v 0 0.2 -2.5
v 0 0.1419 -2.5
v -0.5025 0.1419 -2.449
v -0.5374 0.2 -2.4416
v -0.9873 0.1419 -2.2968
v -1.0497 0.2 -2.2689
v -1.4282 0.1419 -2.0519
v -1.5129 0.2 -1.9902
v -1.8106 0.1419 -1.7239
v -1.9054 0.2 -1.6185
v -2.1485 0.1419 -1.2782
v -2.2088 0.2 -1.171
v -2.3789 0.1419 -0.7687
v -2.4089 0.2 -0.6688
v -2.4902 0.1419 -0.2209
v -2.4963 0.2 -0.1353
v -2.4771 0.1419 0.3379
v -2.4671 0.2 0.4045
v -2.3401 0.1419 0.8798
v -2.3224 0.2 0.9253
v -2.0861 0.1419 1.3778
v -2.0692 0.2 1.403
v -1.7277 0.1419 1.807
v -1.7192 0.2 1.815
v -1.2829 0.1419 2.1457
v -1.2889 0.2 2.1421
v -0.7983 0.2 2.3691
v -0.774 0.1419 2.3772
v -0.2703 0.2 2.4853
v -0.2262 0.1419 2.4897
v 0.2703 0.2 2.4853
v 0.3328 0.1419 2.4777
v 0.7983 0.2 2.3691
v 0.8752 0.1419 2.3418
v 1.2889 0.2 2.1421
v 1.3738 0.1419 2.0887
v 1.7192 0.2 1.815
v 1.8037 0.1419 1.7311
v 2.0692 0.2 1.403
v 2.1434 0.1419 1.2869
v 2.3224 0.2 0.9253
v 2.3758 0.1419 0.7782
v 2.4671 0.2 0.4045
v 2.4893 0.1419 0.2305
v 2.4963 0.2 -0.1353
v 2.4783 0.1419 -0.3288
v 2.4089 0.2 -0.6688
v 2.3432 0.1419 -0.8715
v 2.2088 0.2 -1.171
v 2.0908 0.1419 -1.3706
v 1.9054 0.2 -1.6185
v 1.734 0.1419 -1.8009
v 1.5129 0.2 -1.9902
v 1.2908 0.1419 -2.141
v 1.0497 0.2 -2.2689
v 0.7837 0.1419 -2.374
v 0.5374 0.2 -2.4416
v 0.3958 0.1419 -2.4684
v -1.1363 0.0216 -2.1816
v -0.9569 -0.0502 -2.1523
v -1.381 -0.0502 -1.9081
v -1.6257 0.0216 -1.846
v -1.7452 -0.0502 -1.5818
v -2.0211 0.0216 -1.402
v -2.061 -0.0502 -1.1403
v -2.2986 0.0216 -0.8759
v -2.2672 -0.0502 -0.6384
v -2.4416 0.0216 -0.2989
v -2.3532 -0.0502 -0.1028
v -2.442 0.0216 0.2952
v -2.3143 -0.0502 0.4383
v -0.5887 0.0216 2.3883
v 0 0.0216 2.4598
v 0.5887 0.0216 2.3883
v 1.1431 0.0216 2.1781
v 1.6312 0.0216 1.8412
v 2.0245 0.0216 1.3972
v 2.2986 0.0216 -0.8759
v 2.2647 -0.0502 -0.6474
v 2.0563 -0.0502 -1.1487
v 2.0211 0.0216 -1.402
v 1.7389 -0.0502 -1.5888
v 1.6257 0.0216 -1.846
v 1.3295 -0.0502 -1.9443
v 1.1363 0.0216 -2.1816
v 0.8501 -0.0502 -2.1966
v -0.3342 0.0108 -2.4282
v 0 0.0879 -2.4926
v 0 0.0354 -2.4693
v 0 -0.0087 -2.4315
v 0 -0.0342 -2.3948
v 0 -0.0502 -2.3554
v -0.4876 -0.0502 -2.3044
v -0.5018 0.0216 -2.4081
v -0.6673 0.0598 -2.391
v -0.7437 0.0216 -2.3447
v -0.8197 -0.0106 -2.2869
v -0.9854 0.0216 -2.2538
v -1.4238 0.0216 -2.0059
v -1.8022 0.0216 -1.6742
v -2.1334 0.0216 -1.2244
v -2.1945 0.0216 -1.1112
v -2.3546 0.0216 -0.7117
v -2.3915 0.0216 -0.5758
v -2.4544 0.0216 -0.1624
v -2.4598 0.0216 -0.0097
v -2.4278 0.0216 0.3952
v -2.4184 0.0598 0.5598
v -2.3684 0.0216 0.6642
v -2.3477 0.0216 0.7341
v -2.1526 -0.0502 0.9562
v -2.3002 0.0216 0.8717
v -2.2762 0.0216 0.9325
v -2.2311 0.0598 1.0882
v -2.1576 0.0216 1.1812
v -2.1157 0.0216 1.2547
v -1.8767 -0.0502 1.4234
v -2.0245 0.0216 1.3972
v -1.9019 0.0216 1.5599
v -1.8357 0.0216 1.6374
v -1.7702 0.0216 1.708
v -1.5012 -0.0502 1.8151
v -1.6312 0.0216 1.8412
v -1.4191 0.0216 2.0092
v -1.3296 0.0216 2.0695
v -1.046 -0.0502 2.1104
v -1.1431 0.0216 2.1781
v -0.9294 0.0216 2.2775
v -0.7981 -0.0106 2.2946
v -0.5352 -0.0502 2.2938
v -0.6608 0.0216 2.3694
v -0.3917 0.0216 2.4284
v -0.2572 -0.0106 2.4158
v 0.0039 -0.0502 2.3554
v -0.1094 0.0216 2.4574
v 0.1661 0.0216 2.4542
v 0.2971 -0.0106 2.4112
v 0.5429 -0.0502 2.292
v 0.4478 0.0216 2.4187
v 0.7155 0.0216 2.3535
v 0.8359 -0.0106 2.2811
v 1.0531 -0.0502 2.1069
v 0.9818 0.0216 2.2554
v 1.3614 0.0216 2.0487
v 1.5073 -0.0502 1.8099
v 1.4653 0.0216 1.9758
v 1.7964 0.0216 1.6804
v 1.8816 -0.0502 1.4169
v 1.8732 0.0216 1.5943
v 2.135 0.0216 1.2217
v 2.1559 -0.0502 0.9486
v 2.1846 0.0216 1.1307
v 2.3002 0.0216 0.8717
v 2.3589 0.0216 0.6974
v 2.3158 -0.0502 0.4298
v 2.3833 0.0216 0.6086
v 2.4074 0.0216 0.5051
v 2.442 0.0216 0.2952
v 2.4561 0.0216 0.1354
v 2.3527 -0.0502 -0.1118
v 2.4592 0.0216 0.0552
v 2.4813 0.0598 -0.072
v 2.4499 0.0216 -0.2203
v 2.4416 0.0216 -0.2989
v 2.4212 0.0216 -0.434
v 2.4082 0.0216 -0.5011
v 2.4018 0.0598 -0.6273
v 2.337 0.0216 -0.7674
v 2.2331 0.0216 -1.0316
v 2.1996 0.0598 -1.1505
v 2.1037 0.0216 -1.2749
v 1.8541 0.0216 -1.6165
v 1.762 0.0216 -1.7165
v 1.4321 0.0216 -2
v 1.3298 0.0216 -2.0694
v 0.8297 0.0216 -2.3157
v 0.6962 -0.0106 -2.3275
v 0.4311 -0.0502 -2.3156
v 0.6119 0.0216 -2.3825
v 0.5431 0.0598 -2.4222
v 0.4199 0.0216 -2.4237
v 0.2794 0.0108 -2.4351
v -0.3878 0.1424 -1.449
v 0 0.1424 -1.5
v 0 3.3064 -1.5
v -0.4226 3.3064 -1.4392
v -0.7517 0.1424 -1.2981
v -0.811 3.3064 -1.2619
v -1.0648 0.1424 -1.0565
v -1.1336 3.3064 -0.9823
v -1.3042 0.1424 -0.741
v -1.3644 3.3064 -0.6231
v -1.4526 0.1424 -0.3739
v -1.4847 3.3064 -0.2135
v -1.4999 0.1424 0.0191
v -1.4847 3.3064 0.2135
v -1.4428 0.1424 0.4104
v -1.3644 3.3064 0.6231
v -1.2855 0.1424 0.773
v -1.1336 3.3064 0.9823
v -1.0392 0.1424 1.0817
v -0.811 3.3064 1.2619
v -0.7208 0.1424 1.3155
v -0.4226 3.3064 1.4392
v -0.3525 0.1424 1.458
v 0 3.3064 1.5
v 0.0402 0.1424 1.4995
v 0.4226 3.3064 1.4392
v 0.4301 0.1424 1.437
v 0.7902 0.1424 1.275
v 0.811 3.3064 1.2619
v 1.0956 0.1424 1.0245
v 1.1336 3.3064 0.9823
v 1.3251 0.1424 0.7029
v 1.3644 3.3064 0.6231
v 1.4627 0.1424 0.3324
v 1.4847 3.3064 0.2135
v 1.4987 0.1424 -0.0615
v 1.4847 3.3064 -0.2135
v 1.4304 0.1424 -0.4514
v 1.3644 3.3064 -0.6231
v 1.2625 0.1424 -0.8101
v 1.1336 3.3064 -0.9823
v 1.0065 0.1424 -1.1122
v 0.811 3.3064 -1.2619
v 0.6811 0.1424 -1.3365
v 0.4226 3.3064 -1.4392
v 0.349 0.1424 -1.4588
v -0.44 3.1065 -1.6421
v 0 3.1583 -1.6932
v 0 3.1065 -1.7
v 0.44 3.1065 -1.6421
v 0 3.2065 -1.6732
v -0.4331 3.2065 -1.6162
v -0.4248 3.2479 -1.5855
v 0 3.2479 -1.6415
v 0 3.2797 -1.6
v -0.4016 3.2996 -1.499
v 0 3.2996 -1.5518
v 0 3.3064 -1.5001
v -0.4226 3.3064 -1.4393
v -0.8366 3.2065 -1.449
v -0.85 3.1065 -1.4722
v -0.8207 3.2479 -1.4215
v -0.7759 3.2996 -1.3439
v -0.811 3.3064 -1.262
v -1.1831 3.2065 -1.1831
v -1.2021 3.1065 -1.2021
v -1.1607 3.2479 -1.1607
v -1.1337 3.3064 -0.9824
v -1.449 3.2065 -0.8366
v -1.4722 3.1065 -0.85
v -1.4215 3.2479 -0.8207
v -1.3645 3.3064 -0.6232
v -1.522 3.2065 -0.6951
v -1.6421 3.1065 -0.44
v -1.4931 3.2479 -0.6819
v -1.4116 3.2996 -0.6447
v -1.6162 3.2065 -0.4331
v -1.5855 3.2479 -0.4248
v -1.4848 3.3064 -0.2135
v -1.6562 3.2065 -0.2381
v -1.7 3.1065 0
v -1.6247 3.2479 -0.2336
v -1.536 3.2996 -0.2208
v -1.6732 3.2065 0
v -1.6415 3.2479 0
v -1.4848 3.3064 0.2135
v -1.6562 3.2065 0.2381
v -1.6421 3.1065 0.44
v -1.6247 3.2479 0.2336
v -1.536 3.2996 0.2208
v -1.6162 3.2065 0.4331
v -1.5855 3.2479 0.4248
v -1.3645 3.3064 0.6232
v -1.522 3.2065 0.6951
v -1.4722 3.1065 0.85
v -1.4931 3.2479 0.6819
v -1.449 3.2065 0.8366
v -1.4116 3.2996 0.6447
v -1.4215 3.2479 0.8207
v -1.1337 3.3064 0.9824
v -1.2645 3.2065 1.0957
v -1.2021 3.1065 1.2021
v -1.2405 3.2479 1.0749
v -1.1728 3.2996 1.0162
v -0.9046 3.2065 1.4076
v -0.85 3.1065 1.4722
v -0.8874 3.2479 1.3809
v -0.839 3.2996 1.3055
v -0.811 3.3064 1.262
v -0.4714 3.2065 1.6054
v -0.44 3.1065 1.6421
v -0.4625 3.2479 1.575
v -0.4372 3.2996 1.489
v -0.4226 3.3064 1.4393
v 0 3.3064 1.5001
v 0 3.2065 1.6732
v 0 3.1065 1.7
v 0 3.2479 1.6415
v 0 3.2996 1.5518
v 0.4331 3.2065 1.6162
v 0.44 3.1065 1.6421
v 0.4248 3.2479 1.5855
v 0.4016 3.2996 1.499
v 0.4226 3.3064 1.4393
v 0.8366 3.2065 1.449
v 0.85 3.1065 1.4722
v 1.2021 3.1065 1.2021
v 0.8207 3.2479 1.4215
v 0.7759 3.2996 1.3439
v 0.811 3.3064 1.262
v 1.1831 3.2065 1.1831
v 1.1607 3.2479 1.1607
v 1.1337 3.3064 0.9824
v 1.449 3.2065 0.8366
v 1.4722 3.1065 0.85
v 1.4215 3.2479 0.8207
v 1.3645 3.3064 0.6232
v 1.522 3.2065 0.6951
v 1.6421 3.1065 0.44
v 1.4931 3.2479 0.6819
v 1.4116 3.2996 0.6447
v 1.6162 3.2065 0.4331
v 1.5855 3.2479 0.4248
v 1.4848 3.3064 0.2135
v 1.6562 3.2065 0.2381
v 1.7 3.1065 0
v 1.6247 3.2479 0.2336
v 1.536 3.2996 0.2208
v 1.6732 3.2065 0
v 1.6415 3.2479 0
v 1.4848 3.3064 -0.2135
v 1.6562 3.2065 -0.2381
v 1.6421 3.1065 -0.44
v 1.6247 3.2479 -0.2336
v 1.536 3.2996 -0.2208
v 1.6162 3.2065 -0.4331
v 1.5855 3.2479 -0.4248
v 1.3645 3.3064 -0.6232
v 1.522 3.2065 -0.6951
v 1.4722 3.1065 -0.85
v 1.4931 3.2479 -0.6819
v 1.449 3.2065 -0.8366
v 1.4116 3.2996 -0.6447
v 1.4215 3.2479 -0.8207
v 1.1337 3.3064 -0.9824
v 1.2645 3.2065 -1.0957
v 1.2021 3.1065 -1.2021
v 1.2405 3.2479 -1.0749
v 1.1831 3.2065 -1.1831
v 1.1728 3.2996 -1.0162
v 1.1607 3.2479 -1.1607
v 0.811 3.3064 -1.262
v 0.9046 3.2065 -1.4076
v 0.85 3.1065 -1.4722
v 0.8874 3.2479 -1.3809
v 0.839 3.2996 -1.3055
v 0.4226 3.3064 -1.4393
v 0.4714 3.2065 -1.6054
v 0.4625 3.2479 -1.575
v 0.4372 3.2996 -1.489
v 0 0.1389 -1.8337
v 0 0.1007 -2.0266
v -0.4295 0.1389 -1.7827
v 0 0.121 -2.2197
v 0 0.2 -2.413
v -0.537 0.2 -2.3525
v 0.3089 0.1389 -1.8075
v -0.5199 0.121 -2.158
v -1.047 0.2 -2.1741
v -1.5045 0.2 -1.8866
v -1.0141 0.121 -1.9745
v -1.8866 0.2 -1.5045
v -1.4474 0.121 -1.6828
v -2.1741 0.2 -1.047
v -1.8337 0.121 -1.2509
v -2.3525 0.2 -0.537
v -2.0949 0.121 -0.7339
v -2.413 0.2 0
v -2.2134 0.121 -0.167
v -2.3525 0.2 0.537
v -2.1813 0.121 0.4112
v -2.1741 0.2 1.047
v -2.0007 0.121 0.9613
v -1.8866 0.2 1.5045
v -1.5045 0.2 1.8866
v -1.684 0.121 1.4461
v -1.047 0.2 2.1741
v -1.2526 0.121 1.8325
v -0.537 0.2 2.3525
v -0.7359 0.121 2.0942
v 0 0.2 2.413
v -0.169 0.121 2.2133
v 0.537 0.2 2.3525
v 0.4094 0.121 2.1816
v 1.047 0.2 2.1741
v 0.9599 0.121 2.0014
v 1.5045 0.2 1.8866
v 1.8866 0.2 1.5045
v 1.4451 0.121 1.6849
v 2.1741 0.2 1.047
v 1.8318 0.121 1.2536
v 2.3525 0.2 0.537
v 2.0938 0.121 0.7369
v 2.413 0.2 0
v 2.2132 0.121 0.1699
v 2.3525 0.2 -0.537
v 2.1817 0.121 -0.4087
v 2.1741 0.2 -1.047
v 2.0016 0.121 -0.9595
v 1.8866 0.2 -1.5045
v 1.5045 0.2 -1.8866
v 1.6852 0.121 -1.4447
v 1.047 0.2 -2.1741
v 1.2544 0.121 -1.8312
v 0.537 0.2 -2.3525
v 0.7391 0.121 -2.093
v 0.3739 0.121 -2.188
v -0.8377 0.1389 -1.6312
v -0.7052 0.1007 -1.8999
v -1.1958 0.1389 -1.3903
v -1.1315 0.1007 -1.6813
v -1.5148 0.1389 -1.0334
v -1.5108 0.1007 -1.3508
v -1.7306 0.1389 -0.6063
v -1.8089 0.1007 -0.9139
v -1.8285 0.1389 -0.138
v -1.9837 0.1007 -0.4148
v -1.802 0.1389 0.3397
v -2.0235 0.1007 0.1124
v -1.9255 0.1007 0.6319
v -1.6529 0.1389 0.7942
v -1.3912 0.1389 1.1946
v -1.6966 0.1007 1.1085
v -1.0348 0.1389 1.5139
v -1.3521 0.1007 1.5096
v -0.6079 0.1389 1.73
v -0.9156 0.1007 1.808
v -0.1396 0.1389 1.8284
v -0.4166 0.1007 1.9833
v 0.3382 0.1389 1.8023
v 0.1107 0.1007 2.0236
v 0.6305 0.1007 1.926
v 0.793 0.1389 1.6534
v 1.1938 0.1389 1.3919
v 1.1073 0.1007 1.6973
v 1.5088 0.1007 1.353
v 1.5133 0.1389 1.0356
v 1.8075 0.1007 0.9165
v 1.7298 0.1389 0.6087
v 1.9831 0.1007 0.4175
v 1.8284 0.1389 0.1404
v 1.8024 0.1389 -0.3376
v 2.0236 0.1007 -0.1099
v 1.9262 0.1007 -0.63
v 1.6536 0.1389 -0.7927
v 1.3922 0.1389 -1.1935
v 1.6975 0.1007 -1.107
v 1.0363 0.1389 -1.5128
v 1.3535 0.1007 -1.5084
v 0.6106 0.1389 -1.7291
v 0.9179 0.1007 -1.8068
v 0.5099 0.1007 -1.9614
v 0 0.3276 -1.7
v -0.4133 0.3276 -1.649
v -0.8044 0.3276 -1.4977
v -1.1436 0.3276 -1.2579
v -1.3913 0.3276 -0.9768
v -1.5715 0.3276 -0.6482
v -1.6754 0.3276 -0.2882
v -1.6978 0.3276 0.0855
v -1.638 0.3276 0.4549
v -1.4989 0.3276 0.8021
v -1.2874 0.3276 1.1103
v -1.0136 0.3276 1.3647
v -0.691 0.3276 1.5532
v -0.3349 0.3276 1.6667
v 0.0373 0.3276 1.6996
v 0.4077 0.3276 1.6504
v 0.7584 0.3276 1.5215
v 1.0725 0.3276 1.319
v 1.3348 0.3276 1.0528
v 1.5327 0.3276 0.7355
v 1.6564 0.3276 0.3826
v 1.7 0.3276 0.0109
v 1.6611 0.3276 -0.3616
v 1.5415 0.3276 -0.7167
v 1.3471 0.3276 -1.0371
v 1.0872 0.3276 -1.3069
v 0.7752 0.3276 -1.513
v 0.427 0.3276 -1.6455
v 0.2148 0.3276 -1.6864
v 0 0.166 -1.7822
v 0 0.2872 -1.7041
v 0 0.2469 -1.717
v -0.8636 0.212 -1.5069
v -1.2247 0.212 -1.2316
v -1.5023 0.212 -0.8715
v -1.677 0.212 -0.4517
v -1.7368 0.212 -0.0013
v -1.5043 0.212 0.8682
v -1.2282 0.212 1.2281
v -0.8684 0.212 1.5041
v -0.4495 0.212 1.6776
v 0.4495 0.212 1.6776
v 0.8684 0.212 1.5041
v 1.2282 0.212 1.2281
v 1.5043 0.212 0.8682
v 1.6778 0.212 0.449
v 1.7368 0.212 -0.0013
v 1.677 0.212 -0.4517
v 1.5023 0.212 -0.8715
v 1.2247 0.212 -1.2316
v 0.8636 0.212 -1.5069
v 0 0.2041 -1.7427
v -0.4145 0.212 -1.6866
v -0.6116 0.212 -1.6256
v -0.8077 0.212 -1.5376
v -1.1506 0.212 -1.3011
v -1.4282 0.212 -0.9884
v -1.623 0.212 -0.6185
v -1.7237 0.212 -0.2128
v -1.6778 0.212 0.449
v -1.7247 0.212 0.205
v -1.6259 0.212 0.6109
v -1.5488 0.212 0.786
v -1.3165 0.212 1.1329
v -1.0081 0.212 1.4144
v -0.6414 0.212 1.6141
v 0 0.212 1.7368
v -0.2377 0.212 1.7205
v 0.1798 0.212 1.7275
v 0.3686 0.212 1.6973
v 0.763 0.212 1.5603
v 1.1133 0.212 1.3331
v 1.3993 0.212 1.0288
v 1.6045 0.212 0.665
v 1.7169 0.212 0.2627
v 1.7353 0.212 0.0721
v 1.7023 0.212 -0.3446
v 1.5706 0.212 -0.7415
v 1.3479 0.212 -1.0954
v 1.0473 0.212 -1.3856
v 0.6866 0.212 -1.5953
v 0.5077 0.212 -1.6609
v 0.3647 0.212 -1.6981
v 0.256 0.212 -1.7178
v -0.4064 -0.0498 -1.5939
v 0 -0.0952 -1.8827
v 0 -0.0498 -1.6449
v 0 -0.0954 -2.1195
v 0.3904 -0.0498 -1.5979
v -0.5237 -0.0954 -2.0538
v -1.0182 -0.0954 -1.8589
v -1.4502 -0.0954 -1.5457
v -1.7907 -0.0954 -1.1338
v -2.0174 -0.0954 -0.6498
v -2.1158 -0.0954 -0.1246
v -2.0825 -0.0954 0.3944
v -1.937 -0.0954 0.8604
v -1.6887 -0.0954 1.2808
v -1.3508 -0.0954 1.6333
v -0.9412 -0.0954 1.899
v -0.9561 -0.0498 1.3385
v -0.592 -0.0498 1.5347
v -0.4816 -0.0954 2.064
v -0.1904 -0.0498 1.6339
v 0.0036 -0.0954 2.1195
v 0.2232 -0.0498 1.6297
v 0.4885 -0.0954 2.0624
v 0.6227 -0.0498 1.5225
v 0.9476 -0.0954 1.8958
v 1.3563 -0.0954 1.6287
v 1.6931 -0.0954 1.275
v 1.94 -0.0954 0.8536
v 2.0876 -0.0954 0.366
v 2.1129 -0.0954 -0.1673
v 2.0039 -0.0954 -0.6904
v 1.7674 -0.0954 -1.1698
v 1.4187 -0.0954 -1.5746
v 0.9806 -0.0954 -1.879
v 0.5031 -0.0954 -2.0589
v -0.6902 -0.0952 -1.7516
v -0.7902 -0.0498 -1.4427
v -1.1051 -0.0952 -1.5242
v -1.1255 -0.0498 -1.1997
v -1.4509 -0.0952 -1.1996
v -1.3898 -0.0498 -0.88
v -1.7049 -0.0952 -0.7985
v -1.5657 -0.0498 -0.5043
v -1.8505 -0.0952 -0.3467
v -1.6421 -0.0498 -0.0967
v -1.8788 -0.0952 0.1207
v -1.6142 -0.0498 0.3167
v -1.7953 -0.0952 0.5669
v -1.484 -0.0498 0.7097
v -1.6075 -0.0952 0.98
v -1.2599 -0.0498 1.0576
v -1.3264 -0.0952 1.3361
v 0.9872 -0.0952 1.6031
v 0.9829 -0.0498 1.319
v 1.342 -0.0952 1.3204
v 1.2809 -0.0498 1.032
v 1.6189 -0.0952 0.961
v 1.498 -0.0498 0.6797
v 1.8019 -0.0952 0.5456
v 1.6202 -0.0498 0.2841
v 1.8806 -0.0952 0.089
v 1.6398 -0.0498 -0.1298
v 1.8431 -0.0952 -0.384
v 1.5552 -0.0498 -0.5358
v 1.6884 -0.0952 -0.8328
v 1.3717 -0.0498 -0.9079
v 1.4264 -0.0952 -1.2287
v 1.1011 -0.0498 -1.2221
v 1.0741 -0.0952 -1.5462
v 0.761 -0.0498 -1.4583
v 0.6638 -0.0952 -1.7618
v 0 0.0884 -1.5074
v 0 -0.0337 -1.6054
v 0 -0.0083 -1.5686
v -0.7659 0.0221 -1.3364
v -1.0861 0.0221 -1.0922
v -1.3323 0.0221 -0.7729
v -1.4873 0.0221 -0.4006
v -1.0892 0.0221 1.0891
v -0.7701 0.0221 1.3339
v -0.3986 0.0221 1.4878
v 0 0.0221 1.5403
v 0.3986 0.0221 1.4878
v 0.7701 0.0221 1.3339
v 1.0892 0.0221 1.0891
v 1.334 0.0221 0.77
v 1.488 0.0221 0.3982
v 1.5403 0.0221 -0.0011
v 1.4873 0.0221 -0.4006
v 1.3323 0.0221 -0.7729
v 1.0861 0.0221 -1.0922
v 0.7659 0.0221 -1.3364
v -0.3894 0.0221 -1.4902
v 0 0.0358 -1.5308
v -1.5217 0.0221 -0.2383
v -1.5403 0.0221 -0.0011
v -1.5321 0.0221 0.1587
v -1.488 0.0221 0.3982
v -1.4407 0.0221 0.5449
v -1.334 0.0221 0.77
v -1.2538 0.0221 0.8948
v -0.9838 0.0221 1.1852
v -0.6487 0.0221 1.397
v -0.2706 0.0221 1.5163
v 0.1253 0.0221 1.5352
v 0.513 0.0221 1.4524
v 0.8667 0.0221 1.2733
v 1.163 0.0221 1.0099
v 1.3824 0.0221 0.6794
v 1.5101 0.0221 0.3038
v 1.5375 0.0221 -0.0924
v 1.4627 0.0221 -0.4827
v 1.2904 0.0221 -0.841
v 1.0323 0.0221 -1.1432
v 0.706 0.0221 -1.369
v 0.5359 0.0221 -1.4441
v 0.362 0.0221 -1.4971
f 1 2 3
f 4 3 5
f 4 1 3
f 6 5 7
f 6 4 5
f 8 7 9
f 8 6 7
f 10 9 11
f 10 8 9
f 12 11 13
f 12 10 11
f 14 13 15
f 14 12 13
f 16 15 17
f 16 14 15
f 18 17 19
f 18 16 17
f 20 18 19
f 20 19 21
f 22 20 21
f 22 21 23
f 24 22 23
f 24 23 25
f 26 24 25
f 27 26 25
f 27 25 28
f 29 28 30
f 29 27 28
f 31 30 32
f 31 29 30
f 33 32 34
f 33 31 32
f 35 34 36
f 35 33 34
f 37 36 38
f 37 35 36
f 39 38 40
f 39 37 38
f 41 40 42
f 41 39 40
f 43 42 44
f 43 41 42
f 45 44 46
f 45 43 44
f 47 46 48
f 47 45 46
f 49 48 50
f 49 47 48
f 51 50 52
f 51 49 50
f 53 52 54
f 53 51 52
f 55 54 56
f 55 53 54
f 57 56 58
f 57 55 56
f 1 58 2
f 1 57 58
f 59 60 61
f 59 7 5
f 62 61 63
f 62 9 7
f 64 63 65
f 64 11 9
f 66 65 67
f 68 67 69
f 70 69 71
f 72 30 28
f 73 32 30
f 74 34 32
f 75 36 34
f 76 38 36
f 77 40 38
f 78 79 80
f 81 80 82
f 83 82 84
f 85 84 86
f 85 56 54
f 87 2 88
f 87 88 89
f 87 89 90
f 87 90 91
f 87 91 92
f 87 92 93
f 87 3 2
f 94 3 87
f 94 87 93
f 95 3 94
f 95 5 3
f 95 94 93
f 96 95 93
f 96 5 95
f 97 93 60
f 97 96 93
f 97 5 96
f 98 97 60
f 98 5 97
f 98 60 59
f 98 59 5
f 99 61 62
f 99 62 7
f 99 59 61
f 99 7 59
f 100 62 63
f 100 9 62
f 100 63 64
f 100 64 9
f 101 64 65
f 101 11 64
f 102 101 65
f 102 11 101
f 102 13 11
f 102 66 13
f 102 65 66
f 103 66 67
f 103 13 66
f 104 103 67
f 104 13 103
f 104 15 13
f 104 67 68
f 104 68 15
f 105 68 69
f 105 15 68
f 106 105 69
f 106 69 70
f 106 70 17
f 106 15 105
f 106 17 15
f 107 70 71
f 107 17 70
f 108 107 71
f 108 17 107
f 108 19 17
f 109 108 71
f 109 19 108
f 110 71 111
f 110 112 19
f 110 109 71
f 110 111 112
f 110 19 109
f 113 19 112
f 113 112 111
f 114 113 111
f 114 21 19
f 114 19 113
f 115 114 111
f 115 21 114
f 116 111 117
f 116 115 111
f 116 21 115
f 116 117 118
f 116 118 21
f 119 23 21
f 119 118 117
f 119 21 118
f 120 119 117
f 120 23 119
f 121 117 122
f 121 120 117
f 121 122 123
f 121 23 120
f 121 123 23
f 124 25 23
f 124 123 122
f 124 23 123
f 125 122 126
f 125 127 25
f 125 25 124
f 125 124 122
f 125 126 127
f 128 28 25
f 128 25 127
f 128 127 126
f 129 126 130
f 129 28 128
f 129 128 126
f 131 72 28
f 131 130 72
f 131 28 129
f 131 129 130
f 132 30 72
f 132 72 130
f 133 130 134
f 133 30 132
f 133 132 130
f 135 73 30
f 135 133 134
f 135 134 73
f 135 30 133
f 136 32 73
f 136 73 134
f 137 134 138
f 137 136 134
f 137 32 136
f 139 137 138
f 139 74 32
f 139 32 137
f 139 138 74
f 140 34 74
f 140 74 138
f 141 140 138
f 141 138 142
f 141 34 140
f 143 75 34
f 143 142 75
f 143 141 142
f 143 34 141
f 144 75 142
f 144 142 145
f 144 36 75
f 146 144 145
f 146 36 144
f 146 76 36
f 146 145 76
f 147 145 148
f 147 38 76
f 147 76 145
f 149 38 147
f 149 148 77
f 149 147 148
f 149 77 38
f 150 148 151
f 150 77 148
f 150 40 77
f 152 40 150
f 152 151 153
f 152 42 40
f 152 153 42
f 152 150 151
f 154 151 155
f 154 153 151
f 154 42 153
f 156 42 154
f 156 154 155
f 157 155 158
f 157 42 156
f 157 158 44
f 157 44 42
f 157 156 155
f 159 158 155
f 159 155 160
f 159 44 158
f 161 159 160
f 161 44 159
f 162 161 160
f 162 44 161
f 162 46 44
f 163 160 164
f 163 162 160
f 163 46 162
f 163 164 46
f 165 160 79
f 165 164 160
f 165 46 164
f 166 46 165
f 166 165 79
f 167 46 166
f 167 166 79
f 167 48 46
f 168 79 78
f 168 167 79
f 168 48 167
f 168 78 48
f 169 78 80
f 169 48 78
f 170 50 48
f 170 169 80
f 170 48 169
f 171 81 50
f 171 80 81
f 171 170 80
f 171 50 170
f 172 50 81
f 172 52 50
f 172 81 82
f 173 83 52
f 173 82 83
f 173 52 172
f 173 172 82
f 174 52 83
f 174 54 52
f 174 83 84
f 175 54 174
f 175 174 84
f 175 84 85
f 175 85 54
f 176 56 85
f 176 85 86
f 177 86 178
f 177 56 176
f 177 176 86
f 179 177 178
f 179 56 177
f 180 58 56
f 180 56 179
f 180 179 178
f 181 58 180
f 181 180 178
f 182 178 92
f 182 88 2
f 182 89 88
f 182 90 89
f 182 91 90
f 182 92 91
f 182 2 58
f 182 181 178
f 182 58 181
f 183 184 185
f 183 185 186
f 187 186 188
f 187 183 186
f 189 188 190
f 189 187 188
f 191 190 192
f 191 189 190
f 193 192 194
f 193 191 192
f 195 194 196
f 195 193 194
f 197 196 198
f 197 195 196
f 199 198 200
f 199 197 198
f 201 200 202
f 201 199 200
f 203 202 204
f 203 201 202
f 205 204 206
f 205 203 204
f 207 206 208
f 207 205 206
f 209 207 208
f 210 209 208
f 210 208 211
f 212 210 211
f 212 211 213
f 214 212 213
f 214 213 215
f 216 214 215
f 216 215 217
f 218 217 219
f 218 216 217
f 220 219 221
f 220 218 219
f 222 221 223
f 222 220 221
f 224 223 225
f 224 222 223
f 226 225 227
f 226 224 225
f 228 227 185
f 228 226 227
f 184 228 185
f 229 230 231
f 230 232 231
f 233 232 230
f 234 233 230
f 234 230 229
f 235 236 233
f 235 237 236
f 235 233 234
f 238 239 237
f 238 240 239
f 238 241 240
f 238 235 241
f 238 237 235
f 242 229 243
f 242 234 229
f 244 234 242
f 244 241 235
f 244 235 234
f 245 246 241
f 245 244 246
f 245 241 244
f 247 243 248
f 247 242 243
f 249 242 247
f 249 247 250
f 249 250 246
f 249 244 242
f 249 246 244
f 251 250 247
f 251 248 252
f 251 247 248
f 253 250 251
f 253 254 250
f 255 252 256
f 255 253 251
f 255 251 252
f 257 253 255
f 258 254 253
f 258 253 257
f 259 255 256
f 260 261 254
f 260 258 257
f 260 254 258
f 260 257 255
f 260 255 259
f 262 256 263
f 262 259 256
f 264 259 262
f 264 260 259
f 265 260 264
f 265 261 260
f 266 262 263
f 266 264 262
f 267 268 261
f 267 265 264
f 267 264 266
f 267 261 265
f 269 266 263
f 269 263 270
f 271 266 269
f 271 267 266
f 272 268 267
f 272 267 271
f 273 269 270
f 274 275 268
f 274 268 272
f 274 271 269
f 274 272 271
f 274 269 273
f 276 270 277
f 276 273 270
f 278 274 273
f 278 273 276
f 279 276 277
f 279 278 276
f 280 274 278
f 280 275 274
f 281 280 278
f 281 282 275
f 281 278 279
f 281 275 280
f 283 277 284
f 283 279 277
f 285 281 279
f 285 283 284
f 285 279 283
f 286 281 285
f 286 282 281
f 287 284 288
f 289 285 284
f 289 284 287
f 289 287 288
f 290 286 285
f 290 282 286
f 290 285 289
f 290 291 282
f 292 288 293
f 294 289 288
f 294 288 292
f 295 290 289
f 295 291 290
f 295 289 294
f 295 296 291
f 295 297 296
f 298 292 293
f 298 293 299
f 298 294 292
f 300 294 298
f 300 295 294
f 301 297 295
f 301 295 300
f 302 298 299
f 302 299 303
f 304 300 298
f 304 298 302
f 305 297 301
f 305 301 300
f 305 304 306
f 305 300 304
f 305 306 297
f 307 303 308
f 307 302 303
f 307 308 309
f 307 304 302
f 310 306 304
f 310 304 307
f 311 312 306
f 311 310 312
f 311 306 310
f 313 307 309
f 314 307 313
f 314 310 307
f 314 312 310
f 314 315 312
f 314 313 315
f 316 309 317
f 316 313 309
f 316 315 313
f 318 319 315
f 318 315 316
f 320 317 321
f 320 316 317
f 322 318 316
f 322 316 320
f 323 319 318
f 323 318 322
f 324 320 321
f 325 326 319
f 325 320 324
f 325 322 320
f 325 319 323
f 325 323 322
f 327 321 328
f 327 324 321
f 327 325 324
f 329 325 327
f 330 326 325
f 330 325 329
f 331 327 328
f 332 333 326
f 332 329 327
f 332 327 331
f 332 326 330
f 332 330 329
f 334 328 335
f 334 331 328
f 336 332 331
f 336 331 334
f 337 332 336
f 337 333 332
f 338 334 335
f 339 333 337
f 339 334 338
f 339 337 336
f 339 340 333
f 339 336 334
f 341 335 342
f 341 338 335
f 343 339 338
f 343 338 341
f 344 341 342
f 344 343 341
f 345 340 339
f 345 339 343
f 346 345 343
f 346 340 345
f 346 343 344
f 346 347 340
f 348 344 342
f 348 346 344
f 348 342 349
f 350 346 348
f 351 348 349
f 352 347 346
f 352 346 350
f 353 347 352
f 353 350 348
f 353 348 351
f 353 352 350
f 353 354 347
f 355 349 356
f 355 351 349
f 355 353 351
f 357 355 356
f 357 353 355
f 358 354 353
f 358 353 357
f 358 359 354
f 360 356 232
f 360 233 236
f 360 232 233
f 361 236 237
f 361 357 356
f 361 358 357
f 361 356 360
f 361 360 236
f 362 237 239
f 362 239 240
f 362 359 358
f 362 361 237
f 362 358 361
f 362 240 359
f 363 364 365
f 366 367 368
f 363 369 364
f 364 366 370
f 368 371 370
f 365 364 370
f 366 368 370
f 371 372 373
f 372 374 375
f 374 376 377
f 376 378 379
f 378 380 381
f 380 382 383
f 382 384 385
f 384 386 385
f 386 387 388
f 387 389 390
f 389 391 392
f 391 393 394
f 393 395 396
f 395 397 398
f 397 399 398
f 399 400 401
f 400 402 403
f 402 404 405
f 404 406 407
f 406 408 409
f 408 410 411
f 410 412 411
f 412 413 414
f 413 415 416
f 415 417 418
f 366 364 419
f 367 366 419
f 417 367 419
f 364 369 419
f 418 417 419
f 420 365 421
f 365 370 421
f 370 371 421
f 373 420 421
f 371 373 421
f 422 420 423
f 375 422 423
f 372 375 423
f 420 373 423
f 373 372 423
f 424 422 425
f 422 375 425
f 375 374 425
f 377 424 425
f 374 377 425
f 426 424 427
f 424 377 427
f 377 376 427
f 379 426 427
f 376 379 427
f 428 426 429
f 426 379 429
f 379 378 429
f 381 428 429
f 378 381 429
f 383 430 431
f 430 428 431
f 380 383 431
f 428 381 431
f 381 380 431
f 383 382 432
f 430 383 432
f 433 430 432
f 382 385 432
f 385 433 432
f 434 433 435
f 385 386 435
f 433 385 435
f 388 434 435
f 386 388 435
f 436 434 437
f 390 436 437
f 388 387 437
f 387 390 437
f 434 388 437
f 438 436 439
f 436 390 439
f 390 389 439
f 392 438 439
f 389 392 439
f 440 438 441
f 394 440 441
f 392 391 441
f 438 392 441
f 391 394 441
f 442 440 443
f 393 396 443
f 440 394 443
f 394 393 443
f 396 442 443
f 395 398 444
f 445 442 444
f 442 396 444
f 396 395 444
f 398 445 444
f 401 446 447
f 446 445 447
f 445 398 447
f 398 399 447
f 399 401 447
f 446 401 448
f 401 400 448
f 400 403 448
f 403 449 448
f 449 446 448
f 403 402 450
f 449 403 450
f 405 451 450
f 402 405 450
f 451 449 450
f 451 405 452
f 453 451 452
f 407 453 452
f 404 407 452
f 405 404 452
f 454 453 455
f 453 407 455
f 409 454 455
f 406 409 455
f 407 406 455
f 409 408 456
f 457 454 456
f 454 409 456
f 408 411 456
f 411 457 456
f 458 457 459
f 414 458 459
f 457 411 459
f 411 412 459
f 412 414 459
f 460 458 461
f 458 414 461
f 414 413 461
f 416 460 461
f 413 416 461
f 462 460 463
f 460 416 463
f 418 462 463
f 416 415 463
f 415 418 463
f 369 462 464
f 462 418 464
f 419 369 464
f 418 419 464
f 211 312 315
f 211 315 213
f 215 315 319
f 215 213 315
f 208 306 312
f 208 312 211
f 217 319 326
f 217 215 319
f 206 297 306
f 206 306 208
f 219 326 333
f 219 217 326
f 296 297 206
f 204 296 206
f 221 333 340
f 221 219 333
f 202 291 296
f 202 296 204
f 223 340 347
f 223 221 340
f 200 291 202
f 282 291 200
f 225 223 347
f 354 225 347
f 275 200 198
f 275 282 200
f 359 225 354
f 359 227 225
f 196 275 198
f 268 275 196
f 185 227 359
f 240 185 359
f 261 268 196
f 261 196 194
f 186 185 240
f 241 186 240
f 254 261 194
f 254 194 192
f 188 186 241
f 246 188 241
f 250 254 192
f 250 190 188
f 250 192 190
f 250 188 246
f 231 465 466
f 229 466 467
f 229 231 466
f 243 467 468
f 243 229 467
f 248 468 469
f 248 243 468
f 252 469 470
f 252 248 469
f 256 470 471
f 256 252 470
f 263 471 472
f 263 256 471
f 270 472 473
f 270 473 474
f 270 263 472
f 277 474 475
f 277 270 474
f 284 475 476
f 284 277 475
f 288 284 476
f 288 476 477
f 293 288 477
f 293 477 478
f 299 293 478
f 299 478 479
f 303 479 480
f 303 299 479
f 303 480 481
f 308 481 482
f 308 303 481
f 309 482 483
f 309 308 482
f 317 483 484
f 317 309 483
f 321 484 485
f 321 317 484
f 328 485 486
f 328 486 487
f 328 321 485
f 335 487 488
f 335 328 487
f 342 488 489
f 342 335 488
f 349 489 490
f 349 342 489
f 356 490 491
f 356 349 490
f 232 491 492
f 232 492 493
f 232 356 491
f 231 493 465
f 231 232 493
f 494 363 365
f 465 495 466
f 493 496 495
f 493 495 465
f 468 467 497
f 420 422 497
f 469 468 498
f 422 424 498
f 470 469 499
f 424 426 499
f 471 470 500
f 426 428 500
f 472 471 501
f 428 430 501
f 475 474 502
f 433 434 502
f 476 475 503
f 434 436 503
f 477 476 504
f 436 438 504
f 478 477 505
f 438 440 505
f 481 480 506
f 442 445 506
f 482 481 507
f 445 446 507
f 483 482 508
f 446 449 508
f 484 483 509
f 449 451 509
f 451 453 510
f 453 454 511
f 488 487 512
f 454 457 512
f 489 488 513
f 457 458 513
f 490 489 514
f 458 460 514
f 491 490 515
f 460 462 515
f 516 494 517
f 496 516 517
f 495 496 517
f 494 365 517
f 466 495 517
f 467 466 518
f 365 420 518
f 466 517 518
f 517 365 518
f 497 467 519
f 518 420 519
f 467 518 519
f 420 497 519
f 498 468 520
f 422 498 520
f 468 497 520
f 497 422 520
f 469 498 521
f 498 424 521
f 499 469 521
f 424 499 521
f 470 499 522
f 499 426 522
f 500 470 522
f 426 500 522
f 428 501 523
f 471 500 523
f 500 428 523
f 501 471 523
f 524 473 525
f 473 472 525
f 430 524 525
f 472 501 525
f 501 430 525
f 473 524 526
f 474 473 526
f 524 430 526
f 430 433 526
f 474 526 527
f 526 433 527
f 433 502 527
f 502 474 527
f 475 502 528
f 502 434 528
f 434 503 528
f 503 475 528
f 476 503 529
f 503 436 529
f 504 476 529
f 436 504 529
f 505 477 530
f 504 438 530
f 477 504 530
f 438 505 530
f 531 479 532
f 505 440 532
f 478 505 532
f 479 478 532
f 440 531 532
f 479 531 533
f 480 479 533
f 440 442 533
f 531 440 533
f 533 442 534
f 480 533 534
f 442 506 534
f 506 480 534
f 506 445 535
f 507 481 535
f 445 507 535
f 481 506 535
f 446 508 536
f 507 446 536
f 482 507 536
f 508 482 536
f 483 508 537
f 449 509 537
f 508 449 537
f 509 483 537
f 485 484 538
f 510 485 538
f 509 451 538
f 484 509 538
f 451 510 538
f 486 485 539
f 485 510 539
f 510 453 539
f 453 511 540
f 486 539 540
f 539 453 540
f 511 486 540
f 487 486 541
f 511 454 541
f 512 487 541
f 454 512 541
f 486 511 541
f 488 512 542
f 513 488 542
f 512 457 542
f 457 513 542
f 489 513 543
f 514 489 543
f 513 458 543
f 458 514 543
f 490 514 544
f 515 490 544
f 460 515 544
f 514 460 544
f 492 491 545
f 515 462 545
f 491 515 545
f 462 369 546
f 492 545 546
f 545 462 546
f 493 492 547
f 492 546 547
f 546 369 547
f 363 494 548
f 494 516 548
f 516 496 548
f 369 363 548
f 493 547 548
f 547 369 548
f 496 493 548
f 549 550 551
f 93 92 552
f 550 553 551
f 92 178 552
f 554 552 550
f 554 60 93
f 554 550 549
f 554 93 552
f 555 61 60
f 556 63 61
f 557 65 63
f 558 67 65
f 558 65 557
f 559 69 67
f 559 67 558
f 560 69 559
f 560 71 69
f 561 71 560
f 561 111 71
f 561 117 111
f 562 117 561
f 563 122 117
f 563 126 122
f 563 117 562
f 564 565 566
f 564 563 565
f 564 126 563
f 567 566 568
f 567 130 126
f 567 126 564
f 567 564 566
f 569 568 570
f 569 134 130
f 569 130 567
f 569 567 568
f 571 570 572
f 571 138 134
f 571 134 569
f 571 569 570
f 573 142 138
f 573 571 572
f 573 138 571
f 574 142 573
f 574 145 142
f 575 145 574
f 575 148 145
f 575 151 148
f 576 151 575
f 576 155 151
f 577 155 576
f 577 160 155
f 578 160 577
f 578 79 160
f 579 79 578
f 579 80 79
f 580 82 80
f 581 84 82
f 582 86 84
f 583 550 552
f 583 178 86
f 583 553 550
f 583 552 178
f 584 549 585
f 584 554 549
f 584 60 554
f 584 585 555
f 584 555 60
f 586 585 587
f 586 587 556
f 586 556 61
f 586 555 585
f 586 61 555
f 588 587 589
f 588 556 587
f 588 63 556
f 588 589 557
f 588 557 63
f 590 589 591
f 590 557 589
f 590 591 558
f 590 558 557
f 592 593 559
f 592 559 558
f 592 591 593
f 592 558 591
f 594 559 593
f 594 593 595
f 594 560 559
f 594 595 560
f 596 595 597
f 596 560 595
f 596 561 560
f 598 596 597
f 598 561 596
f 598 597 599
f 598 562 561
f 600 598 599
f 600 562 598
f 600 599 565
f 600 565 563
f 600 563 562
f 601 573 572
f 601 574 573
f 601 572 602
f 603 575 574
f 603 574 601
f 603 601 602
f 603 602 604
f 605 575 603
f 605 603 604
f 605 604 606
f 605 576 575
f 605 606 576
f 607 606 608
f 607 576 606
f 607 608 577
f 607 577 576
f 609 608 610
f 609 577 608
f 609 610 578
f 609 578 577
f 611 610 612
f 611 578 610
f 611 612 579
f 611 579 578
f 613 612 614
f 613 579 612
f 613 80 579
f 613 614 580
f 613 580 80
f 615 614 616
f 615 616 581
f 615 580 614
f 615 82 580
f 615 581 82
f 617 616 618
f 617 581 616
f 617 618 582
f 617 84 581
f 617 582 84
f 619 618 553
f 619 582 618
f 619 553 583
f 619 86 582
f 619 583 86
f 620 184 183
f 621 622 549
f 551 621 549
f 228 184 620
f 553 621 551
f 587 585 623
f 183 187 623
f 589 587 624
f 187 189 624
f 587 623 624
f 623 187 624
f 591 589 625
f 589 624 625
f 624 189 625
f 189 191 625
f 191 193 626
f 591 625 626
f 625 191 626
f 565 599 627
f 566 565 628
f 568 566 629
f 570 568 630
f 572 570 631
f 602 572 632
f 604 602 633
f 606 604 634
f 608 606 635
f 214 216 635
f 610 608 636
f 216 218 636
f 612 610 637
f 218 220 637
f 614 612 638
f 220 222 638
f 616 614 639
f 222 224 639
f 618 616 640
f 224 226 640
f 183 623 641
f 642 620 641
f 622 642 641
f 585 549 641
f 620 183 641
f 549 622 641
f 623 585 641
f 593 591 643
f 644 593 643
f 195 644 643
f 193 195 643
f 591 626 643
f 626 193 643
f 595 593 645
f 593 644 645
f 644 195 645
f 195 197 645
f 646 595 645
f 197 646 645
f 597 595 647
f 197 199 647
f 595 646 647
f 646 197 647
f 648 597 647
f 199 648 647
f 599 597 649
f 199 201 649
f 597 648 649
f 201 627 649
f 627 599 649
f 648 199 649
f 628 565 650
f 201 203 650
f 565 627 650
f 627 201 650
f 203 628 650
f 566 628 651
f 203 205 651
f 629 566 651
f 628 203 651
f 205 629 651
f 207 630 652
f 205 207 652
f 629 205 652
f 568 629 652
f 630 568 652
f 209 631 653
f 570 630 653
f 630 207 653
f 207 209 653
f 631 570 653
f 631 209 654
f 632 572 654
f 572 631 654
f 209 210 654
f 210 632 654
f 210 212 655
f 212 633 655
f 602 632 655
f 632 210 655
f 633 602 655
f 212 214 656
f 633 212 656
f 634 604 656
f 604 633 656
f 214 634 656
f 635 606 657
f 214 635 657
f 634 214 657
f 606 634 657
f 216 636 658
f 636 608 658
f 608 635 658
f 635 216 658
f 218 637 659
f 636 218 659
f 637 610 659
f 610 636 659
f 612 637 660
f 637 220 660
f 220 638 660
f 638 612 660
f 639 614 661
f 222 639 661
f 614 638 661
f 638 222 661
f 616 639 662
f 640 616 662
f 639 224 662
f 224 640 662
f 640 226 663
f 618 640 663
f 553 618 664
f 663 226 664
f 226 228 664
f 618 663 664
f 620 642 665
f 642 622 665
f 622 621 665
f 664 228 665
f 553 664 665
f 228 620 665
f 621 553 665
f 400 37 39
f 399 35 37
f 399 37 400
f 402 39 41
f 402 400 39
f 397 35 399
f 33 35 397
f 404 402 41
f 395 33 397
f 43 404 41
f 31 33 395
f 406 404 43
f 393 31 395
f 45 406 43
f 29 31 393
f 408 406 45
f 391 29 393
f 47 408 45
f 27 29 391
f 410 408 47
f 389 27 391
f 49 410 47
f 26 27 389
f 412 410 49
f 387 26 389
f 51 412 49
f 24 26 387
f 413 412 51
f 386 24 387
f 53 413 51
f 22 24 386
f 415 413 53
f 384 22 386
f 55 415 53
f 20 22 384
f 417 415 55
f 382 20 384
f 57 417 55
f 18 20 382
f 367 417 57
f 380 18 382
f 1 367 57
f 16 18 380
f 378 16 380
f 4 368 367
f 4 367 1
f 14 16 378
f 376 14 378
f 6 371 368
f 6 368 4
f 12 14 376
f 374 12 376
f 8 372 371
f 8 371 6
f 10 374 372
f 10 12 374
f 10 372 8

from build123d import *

# Parameters (mm, degrees)
FILLET1_R = 0.2


with BuildPart() as part:
    # Sketch2 → Revolve1 (revolve)
    with BuildSketch(Plane.XY, mode=Mode.PRIVATE) as revolve1_sk:
        with BuildLine():
            Line((2.5, 0), (2.5, 0.2))
            Line((2.5, 0.2), (2.413045567, 0.2))
            add(Edge.make_bspline(
                [(1.7, 0.2), (2.05568195, -4.4901e-05), (2.413045567, 0.2)],
                knots=[0, 0, 0, 1, 1, 1], degree=2))
            Line((1.7, 0.2), (1.7, 3.306439765))
            Line((1.7, 3.306439765), (1.5, 3.306439765))
            Line((1.5, 3.306439765), (1.5, 0))
            add(Edge.make_bspline(
                [(1.5, 0), (2.00398015, -0.201922677), (2.5, 0)],
                knots=[0, 0, 0, 1, 1, 1], degree=2))
        make_face()
    revolve(revolve1_sk.sketch.rotate(Axis((0, 0, 0), (0, 1, 0)), 90), axis=Axis((0, 0, 0), (0, 1, 0)))

    # Fillet1
    fillet1_edges = [part.edges().sort_by_distance(p)[0] for p in [
        (0, 0, 2.5),
        (0, 0.2, 1.7),
        (0, 3.306439765, 1.7),
        (0, 0, 1.5),
    ]]
    fillet(fillet1_edges, radius=FILLET1_R - 0.0001)  # a hair under: the kernel refuses the full size


solid = part.part
